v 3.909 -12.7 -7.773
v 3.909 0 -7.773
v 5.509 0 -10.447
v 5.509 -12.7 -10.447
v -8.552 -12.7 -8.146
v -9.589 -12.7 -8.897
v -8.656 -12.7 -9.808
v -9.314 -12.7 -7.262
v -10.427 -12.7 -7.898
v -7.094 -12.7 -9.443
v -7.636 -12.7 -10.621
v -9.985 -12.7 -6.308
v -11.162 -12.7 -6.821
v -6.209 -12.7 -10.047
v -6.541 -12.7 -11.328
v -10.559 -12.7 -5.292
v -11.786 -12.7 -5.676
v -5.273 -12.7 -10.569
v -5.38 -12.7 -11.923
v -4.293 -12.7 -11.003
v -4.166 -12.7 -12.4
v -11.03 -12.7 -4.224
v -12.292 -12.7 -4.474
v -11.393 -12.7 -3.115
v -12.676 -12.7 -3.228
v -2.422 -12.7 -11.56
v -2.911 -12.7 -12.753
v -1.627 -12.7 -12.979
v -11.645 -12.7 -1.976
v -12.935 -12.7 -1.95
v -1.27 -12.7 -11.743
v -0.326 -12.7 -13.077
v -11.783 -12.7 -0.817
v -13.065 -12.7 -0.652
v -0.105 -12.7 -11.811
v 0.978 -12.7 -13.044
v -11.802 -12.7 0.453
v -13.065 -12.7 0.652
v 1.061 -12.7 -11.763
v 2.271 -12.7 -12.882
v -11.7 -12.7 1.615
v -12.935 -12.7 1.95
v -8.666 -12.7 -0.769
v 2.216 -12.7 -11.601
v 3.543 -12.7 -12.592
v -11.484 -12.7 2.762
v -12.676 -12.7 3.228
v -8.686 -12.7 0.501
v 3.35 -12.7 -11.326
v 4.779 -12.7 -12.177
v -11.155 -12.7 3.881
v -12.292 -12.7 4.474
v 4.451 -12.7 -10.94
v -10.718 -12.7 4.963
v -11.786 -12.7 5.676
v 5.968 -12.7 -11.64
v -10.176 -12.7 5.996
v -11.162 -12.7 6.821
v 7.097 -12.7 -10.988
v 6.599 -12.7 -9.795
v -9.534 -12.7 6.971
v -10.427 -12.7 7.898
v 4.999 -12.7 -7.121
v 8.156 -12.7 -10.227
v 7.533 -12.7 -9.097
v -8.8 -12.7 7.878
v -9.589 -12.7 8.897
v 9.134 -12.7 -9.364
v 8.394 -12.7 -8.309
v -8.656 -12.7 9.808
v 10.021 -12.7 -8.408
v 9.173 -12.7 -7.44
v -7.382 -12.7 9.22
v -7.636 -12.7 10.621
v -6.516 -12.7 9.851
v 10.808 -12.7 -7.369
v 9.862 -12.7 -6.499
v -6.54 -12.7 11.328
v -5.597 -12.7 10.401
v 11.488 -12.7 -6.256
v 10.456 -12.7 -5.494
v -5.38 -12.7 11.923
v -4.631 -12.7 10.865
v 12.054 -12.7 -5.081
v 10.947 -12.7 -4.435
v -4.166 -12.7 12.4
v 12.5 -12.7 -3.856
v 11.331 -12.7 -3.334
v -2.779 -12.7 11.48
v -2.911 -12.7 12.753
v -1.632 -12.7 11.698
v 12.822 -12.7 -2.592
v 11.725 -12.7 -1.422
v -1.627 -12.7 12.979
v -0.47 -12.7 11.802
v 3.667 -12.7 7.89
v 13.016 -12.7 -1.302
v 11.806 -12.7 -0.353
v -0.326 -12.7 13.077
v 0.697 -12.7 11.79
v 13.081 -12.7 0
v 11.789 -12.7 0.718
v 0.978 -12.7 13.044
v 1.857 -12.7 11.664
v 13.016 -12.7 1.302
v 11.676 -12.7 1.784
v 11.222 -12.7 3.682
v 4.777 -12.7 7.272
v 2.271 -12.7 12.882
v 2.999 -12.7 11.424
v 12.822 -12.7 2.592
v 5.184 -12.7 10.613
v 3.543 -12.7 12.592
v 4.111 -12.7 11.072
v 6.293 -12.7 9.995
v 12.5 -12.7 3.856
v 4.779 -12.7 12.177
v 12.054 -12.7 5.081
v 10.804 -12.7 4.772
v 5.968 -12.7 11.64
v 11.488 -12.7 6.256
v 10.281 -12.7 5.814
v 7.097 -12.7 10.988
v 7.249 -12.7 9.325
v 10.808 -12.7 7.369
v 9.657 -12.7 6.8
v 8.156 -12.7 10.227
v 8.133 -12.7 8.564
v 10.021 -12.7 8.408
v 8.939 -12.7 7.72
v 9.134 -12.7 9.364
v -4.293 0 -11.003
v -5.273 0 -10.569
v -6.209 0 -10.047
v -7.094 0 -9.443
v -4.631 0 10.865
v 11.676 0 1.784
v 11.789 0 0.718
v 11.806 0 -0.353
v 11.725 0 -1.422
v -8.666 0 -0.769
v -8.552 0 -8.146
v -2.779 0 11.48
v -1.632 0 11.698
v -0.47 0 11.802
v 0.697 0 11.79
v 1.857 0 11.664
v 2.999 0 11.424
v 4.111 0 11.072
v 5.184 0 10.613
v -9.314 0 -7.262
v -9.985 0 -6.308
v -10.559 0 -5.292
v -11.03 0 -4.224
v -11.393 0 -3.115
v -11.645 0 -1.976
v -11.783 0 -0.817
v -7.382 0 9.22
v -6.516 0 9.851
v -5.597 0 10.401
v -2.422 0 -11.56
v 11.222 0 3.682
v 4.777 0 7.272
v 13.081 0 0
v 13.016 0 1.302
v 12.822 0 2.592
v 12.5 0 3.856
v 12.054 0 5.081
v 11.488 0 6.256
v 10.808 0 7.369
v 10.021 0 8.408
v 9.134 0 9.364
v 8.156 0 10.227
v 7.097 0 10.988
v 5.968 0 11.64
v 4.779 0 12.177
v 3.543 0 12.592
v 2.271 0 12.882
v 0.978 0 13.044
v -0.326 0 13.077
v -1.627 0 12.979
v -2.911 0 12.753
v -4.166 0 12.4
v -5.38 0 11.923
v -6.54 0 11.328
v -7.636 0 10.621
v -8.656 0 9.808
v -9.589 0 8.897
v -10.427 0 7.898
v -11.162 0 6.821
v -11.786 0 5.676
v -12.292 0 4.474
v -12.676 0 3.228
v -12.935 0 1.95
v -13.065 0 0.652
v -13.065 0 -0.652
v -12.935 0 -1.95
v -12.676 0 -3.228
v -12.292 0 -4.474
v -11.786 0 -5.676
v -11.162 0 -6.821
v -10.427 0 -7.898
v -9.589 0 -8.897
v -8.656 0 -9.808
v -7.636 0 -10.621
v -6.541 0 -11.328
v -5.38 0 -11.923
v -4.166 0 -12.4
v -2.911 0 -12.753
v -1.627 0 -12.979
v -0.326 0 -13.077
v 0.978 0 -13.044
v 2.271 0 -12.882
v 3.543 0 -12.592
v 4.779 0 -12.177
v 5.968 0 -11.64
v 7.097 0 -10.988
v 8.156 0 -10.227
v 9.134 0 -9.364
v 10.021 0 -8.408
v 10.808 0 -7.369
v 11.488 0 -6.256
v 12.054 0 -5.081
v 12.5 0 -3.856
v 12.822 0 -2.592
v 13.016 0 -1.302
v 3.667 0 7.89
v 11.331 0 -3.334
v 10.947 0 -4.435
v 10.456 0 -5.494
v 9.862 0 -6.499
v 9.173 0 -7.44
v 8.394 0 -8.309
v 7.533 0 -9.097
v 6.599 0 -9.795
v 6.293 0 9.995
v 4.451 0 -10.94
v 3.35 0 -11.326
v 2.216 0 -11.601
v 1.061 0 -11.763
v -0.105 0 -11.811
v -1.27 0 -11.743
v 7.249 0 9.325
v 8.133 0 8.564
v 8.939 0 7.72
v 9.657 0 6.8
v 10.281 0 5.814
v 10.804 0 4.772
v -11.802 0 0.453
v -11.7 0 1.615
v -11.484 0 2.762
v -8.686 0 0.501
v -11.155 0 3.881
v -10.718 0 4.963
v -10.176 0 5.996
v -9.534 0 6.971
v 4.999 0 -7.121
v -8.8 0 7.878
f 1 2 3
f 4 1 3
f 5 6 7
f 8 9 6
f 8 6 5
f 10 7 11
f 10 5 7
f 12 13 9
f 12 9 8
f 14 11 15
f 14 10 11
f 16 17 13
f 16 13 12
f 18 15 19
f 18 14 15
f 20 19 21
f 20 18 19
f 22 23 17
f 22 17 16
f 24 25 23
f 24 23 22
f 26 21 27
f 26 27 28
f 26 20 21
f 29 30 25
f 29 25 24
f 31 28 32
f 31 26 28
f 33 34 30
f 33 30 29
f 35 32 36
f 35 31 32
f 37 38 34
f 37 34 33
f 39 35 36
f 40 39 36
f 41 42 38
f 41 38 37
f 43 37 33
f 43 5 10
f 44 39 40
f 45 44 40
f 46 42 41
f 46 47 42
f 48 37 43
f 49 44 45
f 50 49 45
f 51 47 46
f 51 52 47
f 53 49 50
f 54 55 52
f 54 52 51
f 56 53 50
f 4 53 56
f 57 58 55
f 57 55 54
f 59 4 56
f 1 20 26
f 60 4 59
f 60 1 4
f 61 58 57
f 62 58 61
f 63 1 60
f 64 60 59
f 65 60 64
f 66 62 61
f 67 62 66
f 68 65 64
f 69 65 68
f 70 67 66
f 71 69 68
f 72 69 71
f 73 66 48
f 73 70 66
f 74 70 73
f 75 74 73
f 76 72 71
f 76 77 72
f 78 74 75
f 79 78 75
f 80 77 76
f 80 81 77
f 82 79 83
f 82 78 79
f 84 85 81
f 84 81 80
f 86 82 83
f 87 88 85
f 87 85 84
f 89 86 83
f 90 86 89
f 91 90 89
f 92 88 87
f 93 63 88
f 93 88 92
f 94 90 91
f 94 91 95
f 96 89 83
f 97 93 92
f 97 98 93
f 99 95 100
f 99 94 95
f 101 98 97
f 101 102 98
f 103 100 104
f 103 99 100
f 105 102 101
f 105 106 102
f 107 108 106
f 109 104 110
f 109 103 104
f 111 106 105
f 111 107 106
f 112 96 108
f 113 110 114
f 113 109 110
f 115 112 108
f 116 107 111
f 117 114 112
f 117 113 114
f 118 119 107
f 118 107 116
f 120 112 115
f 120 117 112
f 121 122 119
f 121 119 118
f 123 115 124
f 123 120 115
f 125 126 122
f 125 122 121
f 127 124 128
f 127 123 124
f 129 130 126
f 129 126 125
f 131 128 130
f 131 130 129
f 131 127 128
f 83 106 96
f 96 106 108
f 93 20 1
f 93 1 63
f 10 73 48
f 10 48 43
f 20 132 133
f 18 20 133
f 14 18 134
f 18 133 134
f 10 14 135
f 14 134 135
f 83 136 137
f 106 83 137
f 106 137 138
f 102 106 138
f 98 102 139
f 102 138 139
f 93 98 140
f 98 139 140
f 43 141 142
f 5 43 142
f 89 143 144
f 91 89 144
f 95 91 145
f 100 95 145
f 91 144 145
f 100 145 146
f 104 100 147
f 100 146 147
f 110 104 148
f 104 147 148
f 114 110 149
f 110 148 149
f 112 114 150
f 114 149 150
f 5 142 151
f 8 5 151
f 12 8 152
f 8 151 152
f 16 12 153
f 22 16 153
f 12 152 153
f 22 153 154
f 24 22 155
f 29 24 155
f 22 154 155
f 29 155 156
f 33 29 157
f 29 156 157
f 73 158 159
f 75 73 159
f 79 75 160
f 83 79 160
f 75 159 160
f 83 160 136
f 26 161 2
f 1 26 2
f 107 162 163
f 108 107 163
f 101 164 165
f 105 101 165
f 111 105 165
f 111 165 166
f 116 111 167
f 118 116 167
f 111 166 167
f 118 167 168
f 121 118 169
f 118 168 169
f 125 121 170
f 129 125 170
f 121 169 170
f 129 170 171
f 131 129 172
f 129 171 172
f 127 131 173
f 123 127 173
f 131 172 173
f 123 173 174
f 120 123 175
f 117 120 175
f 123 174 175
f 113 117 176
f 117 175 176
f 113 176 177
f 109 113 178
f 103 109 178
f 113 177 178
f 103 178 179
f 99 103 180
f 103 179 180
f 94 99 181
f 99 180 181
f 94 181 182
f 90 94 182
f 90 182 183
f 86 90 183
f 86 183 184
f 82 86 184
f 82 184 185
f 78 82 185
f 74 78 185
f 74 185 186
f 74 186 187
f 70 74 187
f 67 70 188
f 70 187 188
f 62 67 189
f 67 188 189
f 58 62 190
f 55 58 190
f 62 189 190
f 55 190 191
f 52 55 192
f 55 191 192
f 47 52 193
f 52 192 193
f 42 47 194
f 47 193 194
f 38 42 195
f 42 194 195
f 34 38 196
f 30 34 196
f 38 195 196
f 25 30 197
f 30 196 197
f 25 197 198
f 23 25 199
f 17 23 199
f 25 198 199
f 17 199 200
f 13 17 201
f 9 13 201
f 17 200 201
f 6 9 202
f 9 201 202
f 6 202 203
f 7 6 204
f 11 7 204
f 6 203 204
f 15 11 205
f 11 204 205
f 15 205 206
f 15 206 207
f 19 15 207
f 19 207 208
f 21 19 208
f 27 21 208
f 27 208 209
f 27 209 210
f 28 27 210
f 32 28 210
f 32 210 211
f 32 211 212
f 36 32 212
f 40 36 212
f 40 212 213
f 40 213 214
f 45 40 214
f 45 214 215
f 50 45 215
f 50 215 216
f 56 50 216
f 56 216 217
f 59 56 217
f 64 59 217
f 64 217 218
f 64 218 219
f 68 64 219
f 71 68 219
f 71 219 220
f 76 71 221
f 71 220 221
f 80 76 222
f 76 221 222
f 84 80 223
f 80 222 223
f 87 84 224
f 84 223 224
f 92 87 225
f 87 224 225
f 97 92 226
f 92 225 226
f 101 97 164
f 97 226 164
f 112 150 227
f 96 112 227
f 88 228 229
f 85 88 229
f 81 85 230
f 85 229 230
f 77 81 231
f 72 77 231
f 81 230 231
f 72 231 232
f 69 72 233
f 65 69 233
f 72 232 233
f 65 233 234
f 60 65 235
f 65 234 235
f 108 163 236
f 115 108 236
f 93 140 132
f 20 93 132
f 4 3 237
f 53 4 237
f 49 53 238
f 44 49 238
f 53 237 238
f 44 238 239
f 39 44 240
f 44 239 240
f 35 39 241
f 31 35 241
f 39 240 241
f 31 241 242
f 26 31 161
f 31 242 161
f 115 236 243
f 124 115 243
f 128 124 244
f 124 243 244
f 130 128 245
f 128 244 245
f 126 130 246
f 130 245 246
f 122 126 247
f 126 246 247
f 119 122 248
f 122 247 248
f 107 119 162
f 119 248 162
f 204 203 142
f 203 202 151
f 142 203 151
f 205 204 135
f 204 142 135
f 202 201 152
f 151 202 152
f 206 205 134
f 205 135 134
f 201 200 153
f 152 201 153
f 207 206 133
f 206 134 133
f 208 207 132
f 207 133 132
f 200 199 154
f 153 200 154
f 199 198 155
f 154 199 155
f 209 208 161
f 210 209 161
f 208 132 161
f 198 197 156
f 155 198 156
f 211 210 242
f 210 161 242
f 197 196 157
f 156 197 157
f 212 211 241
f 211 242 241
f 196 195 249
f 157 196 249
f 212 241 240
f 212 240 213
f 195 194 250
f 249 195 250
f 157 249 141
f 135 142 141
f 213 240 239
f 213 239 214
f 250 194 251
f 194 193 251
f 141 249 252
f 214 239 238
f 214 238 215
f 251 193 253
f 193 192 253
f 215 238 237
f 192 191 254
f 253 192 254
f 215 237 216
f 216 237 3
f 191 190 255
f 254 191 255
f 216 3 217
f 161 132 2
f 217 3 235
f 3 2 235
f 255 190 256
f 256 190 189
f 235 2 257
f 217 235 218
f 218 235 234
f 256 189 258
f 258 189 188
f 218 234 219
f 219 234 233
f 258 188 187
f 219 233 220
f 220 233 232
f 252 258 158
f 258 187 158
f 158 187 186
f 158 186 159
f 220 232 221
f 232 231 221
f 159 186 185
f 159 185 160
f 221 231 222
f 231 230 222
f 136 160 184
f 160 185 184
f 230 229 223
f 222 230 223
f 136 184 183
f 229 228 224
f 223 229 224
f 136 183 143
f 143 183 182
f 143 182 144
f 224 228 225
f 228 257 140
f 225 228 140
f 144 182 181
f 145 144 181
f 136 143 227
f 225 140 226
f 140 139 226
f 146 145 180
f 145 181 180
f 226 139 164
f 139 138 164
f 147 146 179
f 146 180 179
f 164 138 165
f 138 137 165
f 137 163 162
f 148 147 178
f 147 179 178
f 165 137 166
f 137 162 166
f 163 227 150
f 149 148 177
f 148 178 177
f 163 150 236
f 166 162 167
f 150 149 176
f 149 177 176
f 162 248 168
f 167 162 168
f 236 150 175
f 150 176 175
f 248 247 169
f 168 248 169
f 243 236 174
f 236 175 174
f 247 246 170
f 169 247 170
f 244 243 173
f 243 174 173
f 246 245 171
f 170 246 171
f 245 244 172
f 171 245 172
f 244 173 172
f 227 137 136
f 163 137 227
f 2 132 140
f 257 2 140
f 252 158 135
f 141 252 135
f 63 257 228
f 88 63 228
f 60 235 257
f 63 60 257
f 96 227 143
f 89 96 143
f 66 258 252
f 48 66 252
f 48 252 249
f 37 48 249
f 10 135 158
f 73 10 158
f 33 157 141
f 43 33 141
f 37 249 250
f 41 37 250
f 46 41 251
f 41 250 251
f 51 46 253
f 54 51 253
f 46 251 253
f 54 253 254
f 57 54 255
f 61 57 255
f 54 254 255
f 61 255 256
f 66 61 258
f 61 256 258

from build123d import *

# Parameters (mm, degrees)
F0_R     = 13.081
F1_DEPTH = 12.7


with BuildPart() as f1:
    # F0 (on Front) → F1 (new body)
    with BuildSketch(Plane.XZ):
        Circle(F0_R)
        with BuildLine():
            Line((-11.782692, -0.817253), (-8.666367, -0.76907))
            Line((-8.666367, -0.76907), (-8.552309, -8.146026))
            ThreePointArc((-8.552309, -8.146026), (-10.807673, -4.763815), (-11.782692, -0.817253))
        make_face(mode=Mode.SUBTRACT)
        with BuildLine():
            ThreePointArc((5.509203, -10.447411), (1.640638, -11.696496), (-2.422288, -11.559941))
            Line((-2.422288, -11.559941), (3.909314, -7.772686))
            Line((3.909314, -7.772686), (5.509203, -10.447411))
        make_face(mode=Mode.SUBTRACT)
        with BuildLine():
            Line((6.599107, -9.795484), (4.999218, -7.120759))
            Line((4.999218, -7.120759), (11.33082, -3.333504))
            ThreePointArc((11.33082, -3.333504), (9.529421, -6.977812), (6.599107, -9.795484))
        make_face(mode=Mode.SUBTRACT)
        with BuildLine():
            ThreePointArc((11.675552, 1.783592), (11.809589, 0.182593), (11.725112, -1.421785))
            Line((11.725112, -1.421785), (-4.29314, -11.003121))
            ThreePointArc((-4.29314, -11.003121), (-5.746664, -10.3187), (-7.093858, -9.443352))
            Line((-7.093858, -9.443352), (-7.382412, 9.219529))
            ThreePointArc((-7.382412, 9.219529), (-6.062924, 10.136107), (-4.631254, 10.865137))
            Line((-4.631254, 10.865137), (11.675552, 1.783592))
        make_face(mode=Mode.SUBTRACT)
        with BuildLine():
            ThreePointArc((-11.802325, 0.452596), (-10.949782, 4.427414), (-8.800058, 7.877734))
            Line((-8.800058, 7.877734), (-8.686, 0.500778))
            Line((-8.686, 0.500778), (-11.802325, 0.452596))
        make_face(mode=Mode.SUBTRACT)
        with BuildLine():
            Line((5.183584, 10.612737), (3.667149, 7.889829))
            Line((3.667149, 7.889829), (-2.778511, 11.47953))
            ThreePointArc((-2.778511, 11.47953), (1.278252, 11.741627), (5.183584, 10.612737))
        make_face(mode=Mode.SUBTRACT)
        with BuildLine():
            ThreePointArc((6.293122, 9.994816), (9.309144, 7.269082), (11.222347, 3.682207))
            Line((11.222347, 3.682207), (4.776687, 7.271908))
            Line((4.776687, 7.271908), (6.293122, 9.994816))
        make_face(mode=Mode.SUBTRACT)
    extrude(amount=F1_DEPTH)


solid = f1.part
